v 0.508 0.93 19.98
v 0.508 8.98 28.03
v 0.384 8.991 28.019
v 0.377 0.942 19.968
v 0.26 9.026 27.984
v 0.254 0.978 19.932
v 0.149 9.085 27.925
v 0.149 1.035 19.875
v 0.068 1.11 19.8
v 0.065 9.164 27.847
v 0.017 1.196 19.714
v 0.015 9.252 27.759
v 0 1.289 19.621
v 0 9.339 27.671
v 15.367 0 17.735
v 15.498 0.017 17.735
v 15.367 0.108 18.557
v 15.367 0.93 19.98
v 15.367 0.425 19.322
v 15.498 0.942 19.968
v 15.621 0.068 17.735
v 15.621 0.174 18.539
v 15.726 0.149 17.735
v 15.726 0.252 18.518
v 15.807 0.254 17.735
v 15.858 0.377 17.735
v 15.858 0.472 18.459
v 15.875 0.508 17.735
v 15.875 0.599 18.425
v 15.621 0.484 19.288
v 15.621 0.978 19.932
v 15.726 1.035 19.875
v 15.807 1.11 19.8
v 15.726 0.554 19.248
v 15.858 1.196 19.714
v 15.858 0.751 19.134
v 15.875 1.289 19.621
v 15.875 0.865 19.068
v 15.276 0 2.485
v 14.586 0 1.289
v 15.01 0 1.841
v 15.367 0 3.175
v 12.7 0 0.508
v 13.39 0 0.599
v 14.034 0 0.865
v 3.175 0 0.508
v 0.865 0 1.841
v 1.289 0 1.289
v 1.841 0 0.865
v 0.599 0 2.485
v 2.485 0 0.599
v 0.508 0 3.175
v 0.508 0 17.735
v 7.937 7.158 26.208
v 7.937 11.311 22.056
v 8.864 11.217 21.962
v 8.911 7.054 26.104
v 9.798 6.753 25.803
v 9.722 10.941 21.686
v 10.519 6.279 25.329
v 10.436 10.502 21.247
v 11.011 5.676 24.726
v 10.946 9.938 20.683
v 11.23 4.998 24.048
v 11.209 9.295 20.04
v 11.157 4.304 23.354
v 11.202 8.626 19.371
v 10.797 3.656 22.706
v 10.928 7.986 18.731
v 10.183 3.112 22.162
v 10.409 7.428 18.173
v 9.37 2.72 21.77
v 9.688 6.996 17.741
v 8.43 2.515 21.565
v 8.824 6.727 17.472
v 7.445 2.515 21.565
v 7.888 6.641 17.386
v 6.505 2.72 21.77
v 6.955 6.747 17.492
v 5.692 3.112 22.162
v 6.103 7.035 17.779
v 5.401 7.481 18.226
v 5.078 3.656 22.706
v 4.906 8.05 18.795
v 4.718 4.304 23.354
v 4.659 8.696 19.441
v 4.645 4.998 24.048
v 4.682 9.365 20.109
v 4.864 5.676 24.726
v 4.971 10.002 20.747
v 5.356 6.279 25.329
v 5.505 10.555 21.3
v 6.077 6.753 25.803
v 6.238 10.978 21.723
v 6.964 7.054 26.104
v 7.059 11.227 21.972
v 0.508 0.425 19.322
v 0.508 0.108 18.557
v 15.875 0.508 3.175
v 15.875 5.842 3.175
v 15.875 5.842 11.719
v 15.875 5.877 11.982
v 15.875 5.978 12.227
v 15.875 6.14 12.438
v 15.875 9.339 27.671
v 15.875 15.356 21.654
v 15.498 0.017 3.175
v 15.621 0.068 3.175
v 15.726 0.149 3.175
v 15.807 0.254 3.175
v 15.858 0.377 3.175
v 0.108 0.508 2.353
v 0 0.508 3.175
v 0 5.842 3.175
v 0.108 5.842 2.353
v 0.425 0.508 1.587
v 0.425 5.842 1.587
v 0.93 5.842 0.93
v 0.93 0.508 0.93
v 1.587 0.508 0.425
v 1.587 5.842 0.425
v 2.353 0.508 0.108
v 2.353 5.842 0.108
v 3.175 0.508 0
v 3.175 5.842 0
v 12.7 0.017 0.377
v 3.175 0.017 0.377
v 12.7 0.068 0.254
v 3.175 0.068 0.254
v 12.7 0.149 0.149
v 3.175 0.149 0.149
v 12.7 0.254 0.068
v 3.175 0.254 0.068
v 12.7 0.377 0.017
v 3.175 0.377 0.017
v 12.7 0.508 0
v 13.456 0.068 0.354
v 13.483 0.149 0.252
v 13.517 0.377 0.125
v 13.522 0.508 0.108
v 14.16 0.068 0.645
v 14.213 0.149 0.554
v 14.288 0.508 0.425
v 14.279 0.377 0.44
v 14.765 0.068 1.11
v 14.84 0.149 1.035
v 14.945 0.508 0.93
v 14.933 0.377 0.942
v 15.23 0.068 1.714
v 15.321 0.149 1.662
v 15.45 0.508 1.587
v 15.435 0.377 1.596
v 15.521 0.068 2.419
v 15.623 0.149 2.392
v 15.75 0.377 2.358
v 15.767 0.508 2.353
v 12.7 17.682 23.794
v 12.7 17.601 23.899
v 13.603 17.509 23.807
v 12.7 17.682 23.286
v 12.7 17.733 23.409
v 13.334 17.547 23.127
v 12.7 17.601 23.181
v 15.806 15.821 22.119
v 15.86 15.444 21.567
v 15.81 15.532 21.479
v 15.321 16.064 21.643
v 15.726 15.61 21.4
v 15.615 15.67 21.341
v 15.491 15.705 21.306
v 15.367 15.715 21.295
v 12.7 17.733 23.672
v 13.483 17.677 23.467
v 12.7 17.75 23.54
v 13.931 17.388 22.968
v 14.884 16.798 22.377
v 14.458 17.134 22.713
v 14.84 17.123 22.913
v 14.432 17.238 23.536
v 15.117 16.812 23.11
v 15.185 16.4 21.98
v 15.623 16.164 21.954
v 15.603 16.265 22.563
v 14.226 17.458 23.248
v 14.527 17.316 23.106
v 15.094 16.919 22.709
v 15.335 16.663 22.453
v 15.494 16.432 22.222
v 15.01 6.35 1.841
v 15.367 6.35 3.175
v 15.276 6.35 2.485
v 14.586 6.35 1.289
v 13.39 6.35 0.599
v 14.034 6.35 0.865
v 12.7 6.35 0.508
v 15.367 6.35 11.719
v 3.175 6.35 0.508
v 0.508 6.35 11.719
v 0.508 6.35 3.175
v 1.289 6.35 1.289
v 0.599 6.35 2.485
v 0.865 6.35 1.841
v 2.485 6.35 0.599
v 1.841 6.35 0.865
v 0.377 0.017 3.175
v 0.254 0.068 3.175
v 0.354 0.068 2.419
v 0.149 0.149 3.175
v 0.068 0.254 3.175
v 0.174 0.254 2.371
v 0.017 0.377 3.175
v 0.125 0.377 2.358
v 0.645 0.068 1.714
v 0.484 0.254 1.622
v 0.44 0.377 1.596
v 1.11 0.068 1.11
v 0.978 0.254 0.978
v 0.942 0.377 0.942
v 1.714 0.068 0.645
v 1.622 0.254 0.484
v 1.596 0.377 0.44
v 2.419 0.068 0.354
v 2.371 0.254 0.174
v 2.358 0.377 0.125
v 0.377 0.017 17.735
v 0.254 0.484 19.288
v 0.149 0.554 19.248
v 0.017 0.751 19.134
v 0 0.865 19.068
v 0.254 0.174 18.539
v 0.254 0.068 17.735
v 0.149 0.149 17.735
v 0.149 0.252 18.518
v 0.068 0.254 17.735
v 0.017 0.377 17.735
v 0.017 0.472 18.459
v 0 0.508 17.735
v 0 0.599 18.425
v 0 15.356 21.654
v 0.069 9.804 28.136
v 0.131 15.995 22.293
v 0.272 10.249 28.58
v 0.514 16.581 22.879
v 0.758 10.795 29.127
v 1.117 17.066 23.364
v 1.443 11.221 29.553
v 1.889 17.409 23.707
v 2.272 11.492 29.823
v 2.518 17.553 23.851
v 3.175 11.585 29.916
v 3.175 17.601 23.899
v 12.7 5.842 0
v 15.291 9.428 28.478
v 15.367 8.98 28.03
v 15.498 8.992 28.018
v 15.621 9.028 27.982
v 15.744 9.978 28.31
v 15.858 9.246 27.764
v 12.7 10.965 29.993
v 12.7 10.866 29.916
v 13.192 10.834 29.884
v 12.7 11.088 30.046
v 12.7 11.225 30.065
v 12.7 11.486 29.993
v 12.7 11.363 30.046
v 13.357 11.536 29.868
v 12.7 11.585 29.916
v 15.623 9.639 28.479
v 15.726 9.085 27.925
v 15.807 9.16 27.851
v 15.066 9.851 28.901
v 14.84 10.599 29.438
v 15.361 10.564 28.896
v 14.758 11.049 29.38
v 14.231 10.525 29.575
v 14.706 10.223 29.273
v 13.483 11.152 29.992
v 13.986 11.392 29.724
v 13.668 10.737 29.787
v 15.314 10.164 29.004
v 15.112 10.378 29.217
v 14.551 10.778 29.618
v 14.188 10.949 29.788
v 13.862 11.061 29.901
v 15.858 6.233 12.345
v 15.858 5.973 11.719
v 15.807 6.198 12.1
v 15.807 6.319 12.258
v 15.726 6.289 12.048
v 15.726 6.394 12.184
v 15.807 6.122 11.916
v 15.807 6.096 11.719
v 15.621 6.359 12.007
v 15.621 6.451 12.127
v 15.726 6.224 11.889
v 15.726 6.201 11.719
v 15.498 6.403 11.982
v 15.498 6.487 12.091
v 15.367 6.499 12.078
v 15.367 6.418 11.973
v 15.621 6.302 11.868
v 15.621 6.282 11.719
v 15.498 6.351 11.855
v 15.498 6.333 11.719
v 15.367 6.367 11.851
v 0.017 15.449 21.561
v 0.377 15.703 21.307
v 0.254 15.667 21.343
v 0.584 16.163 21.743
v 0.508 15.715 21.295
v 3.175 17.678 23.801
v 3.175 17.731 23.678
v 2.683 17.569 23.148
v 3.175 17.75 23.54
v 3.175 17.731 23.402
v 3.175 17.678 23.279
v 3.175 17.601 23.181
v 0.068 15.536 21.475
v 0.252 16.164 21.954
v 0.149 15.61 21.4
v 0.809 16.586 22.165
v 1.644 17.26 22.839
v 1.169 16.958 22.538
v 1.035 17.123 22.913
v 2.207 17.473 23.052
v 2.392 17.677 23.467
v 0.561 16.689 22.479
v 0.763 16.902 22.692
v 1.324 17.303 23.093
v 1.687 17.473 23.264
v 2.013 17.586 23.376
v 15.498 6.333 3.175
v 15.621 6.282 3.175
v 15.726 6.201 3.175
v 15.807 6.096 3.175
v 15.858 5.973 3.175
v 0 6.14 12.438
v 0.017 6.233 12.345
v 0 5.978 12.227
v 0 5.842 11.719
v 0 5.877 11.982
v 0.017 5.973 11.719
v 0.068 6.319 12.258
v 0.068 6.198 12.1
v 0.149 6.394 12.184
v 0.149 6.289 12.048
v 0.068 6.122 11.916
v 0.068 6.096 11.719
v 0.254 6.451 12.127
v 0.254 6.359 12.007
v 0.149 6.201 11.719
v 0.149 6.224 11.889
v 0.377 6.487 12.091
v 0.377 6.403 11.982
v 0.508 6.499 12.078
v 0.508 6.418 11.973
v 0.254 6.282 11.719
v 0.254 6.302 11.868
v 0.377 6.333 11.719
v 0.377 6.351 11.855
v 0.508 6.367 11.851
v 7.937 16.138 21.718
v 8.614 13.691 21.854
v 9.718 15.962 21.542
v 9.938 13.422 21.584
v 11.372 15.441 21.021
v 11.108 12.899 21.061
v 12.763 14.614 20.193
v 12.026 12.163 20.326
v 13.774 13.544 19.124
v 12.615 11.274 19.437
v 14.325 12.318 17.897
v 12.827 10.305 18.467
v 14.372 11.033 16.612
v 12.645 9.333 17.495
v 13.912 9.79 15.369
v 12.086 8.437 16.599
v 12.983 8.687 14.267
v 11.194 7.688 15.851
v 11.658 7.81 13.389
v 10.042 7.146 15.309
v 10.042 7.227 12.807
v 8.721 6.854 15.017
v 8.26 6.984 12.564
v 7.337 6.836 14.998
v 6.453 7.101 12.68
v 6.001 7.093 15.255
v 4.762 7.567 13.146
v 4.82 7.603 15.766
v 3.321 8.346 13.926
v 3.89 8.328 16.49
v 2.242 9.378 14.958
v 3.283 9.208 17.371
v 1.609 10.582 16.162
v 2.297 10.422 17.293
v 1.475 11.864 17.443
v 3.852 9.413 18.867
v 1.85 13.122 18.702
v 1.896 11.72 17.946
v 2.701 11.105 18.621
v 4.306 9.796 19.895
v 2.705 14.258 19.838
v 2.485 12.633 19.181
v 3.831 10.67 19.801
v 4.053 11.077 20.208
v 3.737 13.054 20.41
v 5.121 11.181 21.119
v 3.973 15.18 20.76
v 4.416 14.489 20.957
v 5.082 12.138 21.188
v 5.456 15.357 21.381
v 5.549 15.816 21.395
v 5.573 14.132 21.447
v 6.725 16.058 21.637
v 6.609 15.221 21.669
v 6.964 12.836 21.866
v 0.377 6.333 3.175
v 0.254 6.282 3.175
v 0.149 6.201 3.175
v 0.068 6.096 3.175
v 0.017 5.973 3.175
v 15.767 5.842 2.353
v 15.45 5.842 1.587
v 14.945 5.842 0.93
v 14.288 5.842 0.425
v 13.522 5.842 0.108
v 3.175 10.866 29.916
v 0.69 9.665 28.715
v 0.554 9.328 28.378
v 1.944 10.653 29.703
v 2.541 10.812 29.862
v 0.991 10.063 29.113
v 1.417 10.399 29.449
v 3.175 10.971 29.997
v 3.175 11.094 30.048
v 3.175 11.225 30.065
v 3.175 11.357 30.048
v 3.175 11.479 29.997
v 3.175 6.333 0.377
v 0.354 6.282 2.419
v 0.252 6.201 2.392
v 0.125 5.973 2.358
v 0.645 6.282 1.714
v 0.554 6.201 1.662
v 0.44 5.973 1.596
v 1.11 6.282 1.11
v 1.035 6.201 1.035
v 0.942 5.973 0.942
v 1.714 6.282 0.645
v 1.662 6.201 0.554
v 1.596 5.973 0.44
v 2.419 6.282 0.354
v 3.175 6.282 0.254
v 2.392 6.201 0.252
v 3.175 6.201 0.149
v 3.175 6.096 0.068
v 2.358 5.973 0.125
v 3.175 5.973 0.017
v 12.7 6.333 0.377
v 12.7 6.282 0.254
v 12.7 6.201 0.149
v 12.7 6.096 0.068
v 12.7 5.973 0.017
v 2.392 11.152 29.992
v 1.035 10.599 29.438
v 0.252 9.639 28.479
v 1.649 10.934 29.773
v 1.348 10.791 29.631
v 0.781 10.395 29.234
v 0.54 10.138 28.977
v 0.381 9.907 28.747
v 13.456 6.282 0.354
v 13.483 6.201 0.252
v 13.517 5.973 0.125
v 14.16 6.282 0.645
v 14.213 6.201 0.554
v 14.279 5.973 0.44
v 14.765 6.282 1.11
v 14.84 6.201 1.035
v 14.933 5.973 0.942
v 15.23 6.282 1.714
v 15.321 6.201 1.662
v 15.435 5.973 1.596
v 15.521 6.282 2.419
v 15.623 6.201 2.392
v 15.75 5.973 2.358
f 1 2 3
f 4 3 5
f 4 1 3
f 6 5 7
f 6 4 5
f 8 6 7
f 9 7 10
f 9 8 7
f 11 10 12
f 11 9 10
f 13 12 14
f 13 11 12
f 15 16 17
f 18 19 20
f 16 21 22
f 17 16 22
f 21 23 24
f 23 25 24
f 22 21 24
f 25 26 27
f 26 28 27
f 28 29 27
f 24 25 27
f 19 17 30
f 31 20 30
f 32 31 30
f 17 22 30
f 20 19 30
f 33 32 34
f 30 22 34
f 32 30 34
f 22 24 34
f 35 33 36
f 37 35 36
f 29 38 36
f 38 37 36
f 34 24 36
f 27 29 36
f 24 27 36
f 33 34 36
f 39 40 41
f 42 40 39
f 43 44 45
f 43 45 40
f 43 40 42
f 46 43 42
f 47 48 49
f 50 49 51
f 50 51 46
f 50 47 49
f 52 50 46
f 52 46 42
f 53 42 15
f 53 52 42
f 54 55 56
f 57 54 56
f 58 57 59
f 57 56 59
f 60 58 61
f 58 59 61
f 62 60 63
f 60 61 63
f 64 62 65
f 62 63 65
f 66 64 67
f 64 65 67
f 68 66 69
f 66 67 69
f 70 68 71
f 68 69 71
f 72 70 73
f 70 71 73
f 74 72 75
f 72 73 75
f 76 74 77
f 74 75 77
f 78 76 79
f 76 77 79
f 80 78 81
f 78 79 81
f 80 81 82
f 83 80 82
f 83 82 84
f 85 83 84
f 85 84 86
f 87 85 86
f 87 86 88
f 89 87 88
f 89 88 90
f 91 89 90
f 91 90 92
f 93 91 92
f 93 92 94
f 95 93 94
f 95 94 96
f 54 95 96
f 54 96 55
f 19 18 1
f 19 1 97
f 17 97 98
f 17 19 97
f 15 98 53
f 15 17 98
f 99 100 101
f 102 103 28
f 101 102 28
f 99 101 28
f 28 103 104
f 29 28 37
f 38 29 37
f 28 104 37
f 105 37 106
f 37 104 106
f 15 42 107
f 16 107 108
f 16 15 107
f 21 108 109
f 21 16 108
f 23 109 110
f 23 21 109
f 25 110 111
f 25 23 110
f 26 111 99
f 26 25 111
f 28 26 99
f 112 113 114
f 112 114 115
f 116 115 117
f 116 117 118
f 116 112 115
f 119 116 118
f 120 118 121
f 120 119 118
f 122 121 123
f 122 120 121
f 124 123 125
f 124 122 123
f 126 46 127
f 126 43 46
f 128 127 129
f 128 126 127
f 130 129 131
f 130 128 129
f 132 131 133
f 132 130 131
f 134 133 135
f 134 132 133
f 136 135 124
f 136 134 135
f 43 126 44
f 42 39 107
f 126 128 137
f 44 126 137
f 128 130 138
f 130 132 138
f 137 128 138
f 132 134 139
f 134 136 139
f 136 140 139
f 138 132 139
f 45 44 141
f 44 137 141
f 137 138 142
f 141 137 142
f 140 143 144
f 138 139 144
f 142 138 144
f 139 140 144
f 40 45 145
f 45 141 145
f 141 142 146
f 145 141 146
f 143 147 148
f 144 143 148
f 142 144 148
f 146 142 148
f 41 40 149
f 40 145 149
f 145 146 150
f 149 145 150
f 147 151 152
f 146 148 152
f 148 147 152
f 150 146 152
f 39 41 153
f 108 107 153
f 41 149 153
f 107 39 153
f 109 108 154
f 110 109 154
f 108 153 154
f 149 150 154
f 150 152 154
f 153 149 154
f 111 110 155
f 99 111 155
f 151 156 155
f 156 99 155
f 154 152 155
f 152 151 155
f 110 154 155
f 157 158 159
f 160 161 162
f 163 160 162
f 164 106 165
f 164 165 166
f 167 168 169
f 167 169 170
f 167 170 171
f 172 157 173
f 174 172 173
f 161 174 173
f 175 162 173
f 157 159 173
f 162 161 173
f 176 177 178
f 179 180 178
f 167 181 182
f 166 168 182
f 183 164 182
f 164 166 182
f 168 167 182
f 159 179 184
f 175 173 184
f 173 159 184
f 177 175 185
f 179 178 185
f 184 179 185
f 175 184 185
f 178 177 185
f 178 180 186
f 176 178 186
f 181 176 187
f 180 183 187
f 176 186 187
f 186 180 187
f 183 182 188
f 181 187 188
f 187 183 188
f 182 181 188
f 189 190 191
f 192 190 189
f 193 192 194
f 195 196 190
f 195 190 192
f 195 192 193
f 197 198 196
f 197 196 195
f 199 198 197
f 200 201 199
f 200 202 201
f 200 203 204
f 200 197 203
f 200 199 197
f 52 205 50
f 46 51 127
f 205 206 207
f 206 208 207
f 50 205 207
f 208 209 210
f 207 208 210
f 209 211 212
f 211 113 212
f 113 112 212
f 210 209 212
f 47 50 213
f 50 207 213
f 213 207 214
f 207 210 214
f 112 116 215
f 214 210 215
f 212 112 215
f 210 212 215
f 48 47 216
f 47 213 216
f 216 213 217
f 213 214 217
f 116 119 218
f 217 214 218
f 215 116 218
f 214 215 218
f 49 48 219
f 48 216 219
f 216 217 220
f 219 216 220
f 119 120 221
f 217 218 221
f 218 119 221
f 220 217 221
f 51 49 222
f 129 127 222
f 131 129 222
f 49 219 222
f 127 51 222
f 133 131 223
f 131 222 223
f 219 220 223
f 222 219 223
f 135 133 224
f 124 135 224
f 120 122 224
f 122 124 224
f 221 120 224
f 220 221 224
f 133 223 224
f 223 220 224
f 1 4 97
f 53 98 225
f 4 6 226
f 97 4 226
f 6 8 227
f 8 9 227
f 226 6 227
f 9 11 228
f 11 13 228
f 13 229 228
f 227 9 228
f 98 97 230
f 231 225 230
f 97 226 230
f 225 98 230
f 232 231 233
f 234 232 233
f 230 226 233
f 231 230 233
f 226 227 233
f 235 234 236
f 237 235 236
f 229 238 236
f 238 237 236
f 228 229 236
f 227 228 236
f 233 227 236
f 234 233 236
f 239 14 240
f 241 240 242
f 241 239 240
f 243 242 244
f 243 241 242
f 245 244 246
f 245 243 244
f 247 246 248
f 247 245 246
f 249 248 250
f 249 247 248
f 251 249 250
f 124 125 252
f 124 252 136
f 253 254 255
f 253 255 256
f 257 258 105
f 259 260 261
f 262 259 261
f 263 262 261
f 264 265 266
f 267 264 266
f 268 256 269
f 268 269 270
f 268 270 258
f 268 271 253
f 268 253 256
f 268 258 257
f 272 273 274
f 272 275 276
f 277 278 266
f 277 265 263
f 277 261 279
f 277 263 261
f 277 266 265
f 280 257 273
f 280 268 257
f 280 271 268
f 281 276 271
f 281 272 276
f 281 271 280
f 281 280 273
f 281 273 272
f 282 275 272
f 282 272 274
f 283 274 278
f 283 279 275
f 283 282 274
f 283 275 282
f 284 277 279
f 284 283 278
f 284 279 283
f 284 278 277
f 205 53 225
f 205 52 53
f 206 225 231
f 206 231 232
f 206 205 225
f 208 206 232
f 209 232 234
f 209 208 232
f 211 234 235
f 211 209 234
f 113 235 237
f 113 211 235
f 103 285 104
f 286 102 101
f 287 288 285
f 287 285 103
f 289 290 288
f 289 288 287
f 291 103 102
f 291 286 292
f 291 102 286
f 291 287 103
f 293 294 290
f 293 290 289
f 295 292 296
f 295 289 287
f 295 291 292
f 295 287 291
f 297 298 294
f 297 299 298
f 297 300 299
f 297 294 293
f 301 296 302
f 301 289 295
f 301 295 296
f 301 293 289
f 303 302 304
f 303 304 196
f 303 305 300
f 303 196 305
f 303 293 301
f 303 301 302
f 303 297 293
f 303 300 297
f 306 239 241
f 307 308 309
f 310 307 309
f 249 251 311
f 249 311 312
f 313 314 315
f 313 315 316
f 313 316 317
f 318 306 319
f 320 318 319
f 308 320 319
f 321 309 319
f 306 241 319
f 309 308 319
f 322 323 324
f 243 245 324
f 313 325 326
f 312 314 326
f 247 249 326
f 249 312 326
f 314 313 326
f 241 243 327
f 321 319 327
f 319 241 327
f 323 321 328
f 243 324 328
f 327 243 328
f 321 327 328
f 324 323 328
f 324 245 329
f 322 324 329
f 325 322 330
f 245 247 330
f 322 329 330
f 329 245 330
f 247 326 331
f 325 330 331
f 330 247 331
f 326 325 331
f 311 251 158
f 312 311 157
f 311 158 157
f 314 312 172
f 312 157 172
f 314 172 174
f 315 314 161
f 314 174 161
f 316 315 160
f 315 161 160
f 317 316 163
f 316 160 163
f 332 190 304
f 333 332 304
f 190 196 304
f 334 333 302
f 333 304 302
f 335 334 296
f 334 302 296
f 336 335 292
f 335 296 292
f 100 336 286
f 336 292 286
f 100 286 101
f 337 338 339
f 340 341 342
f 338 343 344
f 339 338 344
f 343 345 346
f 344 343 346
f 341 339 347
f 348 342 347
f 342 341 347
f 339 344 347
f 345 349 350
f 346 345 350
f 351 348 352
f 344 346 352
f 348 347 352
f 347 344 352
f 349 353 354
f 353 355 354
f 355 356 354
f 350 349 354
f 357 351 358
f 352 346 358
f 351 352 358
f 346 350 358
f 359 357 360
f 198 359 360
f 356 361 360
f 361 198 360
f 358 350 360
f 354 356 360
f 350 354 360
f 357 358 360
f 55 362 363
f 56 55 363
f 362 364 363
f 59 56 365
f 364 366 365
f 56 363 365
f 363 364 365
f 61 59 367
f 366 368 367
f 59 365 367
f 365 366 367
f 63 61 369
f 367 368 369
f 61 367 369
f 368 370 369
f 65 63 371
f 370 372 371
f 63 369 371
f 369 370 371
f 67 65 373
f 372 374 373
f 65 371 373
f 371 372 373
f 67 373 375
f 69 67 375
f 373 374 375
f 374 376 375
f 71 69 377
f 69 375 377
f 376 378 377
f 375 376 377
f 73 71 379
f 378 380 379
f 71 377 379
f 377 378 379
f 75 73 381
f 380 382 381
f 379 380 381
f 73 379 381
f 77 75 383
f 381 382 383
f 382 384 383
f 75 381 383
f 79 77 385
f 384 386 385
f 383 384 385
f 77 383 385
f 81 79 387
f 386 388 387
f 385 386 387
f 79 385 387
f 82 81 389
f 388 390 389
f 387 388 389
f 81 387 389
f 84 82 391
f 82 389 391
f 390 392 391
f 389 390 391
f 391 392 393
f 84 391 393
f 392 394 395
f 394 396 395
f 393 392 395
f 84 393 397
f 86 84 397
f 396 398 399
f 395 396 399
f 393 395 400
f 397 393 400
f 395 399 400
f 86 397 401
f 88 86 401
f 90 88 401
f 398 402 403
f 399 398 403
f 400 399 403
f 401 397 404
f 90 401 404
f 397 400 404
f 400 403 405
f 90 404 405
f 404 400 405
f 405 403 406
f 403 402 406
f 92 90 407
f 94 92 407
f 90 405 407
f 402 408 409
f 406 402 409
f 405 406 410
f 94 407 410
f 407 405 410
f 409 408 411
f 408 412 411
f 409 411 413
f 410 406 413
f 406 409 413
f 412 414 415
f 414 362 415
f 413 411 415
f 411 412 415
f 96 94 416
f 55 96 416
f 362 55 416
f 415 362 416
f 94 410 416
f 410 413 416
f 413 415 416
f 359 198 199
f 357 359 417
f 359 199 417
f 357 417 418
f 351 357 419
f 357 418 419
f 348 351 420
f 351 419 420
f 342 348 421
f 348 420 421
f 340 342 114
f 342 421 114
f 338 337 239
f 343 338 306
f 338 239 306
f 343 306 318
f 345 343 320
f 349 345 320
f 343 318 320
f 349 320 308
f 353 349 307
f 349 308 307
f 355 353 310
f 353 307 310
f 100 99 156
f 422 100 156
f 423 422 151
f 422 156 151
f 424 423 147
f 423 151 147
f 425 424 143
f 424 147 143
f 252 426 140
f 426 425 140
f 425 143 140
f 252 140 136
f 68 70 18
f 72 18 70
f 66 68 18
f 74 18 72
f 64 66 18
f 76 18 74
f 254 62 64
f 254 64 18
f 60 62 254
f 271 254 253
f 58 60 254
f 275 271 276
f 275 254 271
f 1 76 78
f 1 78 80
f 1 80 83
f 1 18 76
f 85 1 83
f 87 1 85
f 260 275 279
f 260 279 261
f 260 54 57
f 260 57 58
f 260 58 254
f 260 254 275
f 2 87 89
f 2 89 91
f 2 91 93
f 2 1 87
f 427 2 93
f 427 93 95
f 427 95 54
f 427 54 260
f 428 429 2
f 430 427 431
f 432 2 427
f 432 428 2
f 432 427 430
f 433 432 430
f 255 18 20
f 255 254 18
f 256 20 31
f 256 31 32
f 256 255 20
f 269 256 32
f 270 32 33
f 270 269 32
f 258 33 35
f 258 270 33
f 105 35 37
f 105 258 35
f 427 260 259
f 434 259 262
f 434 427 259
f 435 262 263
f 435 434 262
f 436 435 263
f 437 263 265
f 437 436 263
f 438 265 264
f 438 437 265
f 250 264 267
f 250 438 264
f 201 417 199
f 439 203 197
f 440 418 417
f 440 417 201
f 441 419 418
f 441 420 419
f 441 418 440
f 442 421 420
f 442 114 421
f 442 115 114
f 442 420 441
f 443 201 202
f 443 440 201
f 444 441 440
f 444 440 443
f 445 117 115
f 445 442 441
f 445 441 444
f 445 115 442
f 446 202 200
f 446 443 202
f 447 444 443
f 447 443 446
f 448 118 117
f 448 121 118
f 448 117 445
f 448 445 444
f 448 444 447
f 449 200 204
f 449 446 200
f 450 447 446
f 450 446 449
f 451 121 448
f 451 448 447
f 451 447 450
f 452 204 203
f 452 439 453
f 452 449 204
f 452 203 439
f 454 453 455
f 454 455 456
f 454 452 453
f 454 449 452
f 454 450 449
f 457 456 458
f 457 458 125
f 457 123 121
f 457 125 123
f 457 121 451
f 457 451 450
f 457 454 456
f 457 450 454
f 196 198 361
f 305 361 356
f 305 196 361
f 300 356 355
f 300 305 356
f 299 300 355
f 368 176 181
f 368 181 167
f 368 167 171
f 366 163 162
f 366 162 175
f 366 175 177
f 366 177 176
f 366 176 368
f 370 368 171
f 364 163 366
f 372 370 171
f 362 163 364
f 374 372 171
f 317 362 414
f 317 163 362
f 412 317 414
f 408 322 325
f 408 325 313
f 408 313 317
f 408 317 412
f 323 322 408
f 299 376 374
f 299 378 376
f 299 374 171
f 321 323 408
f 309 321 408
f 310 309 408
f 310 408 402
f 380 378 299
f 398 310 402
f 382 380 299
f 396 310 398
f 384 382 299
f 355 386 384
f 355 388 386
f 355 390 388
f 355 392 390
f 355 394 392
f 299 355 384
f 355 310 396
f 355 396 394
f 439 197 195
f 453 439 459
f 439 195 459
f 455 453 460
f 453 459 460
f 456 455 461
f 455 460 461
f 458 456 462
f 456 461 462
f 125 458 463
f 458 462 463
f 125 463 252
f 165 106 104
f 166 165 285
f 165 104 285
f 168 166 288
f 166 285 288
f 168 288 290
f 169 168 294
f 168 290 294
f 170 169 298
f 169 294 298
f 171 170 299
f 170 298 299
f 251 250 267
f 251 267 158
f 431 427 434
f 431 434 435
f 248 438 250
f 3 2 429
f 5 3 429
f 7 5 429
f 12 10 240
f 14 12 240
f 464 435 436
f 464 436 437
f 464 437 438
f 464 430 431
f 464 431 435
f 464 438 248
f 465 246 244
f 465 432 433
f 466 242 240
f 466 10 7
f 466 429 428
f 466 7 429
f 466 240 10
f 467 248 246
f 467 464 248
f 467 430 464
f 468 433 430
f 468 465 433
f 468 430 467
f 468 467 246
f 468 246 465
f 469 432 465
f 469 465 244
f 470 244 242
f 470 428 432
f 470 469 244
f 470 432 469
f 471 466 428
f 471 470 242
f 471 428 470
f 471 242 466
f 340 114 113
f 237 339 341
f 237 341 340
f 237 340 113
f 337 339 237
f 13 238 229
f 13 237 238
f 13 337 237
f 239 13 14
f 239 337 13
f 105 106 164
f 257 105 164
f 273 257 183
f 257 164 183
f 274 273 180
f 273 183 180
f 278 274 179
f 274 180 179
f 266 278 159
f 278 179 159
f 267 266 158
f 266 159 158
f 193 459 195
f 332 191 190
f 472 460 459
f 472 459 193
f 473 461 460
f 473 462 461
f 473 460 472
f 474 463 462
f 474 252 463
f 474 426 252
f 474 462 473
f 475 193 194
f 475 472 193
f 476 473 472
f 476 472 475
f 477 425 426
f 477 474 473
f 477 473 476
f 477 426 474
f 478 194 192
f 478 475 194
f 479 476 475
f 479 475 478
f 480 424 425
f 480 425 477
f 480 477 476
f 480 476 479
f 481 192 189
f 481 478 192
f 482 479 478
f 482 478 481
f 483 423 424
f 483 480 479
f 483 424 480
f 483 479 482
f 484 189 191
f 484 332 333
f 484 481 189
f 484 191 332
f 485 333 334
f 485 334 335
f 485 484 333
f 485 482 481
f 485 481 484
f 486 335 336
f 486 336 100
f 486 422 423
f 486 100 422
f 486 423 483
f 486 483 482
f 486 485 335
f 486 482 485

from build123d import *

# Parameters (mm, degrees)
BOSS_EXTRUDE1_DEPTH = 15.875
SKETCH2_R           = 3.302
CUT_EXTRUDE1_DEPTH  = 38.921561078
CHAMFER1_SIZE       = 3.175
CHAMFER1_SIZE2      = 3.652419693
FILLET1_R           = 3.175
FILLET2_R           = 0.508


with BuildPart() as part:
    # Sketch1 → Boss-Extrude1 (new body)
    with BuildSketch(Plane(origin=(0, 0, 0), x_dir=(0, 0, -1), z_dir=(1, 0, 0))):
        Polygon((0, 0), (-19.05, 0), (-30.275320151, 11.225320151), (-23.540128061, 17.960512242), (-11.929615818, 6.35), (0, 6.35), align=None)
    extrude(amount=BOSS_EXTRUDE1_DEPTH)

    # Sketch2 → Cut-Extrude1 (cut, through all)
    with BuildSketch(Plane(origin=(0, -2.789807909, 2.789807909), x_dir=(1, 0, 0), z_dir=(0, 0.7071067811865465, -0.7071067811865486))):
        with Locations(Location((7.9375, -20.291640303, 0), (0, 0, 270))):
            Circle(SKETCH2_R)
    extrude(amount=-CUT_EXTRUDE1_DEPTH, mode=Mode.SUBTRACT)

    # Chamfer1
    chamfer1_edges = [part.edges().sort_by_distance(p)[0] for p in [
        (7.9375, 9.223681959, 14.803297777),
    ]]
    chamfer1_side = [part.faces().sort_by_distance(p)[0] for p in [
        (7.9375, 17.799015553, 23.378631371),
    ]]
    chamfer(chamfer1_edges, length=CHAMFER1_SIZE, length2=CHAMFER1_SIZE2, reference=chamfer1_side[0])

    # Fillet1
    fillet1_edges = [part.edges().sort_by_distance(p)[0] for p in [
        (7.9375, 0, 19.05),
        (15.875, 14.592916197, 26.907724106),
        (15.875, 3.175, 0),
        (0, 14.592916197, 26.907724106),
        (0, 3.175, 0),
    ]]
    fillet(fillet1_edges, radius=FILLET1_R)

    # Fillet2
    fillet2_edges = [part.edges().sort_by_distance(p)[0] for p in [
        (7.9375, 6.35, 11.929615818),
        (15.875, 11.032724106, 16.612339924),
        (7.9375, 6.35, 0),
        (7.9375, 0, 0),
        (0, 6.35, 7.552307909),
        (15.875, 6.35, 7.552307909),
        (14.94506403, 6.35, 0.92993597),
        (0.92993597, 6.35, 0.92993597),
        (0, 0, 10.45493597),
        (0, 4.955096045, 24.005096045),
        (0, 0.241682484, 18.949891837),
        (15.875, 0, 10.45493597),
        (14.94506403, 0, 0.92993597),
        (0.92993597, 0, 0.92993597),
        (15.875, 4.955096045, 24.005096045),
        (15.875, 0.241682484, 18.949891837),
        (7.9375, 11.225320151, 30.275320151),
        (7.9375, 17.960512242, 23.540128061),
        (14.94506403, 10.567756121, 29.617756121),
        (0.92993597, 10.567756121, 29.617756121),
        (14.94506403, 17.302948212, 22.88256403),
        (0.92993597, 17.302948212, 22.88256403),
        (0, 11.032724106, 16.612339924),
    ]]
    fillet(fillet2_edges, radius=FILLET2_R)


solid = part.part
